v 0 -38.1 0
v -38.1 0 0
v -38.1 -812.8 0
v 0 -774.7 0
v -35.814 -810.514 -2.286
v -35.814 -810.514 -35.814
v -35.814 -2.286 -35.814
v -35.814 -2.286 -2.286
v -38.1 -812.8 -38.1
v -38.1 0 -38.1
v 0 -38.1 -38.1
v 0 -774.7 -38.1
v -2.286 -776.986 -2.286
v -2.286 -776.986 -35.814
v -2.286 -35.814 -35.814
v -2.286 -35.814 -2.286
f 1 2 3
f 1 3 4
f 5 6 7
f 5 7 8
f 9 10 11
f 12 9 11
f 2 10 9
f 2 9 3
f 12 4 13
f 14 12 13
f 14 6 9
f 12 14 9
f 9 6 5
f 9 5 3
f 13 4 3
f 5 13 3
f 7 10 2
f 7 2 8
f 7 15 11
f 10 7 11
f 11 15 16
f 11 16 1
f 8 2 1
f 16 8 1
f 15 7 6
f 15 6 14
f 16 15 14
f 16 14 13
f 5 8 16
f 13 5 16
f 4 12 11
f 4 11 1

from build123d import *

# Parameters (mm, degrees)
F0_W     = 38.1
F0_H     = 38.1
F0_W_2   = 33.528
F0_H_2   = 33.528
F1_DEPTH = 812.8
F3_DEPTH = 50.8


with BuildPart() as f1:
    # F0 (on Front) → F1 (new body)
    with BuildSketch(Plane.XZ):
        with Locations((-19.05, -19.05)):
            Rectangle(F0_W, F0_H)
        with Locations((-19.05, -19.05)):
            Rectangle(F0_W_2, F0_H_2, mode=Mode.SUBTRACT)
    extrude(amount=F1_DEPTH)

    # F2 (on face) → F3 (cut)
    with BuildSketch(Plane.XY):
        Polygon((0, -774.7), (-38.1, -812.8), (0, -812.8), align=None)
        Polygon((0, 0), (-38.1, 0), (0, -38.1), align=None)
    extrude(amount=-F3_DEPTH, mode=Mode.SUBTRACT)


solid = f1.part
